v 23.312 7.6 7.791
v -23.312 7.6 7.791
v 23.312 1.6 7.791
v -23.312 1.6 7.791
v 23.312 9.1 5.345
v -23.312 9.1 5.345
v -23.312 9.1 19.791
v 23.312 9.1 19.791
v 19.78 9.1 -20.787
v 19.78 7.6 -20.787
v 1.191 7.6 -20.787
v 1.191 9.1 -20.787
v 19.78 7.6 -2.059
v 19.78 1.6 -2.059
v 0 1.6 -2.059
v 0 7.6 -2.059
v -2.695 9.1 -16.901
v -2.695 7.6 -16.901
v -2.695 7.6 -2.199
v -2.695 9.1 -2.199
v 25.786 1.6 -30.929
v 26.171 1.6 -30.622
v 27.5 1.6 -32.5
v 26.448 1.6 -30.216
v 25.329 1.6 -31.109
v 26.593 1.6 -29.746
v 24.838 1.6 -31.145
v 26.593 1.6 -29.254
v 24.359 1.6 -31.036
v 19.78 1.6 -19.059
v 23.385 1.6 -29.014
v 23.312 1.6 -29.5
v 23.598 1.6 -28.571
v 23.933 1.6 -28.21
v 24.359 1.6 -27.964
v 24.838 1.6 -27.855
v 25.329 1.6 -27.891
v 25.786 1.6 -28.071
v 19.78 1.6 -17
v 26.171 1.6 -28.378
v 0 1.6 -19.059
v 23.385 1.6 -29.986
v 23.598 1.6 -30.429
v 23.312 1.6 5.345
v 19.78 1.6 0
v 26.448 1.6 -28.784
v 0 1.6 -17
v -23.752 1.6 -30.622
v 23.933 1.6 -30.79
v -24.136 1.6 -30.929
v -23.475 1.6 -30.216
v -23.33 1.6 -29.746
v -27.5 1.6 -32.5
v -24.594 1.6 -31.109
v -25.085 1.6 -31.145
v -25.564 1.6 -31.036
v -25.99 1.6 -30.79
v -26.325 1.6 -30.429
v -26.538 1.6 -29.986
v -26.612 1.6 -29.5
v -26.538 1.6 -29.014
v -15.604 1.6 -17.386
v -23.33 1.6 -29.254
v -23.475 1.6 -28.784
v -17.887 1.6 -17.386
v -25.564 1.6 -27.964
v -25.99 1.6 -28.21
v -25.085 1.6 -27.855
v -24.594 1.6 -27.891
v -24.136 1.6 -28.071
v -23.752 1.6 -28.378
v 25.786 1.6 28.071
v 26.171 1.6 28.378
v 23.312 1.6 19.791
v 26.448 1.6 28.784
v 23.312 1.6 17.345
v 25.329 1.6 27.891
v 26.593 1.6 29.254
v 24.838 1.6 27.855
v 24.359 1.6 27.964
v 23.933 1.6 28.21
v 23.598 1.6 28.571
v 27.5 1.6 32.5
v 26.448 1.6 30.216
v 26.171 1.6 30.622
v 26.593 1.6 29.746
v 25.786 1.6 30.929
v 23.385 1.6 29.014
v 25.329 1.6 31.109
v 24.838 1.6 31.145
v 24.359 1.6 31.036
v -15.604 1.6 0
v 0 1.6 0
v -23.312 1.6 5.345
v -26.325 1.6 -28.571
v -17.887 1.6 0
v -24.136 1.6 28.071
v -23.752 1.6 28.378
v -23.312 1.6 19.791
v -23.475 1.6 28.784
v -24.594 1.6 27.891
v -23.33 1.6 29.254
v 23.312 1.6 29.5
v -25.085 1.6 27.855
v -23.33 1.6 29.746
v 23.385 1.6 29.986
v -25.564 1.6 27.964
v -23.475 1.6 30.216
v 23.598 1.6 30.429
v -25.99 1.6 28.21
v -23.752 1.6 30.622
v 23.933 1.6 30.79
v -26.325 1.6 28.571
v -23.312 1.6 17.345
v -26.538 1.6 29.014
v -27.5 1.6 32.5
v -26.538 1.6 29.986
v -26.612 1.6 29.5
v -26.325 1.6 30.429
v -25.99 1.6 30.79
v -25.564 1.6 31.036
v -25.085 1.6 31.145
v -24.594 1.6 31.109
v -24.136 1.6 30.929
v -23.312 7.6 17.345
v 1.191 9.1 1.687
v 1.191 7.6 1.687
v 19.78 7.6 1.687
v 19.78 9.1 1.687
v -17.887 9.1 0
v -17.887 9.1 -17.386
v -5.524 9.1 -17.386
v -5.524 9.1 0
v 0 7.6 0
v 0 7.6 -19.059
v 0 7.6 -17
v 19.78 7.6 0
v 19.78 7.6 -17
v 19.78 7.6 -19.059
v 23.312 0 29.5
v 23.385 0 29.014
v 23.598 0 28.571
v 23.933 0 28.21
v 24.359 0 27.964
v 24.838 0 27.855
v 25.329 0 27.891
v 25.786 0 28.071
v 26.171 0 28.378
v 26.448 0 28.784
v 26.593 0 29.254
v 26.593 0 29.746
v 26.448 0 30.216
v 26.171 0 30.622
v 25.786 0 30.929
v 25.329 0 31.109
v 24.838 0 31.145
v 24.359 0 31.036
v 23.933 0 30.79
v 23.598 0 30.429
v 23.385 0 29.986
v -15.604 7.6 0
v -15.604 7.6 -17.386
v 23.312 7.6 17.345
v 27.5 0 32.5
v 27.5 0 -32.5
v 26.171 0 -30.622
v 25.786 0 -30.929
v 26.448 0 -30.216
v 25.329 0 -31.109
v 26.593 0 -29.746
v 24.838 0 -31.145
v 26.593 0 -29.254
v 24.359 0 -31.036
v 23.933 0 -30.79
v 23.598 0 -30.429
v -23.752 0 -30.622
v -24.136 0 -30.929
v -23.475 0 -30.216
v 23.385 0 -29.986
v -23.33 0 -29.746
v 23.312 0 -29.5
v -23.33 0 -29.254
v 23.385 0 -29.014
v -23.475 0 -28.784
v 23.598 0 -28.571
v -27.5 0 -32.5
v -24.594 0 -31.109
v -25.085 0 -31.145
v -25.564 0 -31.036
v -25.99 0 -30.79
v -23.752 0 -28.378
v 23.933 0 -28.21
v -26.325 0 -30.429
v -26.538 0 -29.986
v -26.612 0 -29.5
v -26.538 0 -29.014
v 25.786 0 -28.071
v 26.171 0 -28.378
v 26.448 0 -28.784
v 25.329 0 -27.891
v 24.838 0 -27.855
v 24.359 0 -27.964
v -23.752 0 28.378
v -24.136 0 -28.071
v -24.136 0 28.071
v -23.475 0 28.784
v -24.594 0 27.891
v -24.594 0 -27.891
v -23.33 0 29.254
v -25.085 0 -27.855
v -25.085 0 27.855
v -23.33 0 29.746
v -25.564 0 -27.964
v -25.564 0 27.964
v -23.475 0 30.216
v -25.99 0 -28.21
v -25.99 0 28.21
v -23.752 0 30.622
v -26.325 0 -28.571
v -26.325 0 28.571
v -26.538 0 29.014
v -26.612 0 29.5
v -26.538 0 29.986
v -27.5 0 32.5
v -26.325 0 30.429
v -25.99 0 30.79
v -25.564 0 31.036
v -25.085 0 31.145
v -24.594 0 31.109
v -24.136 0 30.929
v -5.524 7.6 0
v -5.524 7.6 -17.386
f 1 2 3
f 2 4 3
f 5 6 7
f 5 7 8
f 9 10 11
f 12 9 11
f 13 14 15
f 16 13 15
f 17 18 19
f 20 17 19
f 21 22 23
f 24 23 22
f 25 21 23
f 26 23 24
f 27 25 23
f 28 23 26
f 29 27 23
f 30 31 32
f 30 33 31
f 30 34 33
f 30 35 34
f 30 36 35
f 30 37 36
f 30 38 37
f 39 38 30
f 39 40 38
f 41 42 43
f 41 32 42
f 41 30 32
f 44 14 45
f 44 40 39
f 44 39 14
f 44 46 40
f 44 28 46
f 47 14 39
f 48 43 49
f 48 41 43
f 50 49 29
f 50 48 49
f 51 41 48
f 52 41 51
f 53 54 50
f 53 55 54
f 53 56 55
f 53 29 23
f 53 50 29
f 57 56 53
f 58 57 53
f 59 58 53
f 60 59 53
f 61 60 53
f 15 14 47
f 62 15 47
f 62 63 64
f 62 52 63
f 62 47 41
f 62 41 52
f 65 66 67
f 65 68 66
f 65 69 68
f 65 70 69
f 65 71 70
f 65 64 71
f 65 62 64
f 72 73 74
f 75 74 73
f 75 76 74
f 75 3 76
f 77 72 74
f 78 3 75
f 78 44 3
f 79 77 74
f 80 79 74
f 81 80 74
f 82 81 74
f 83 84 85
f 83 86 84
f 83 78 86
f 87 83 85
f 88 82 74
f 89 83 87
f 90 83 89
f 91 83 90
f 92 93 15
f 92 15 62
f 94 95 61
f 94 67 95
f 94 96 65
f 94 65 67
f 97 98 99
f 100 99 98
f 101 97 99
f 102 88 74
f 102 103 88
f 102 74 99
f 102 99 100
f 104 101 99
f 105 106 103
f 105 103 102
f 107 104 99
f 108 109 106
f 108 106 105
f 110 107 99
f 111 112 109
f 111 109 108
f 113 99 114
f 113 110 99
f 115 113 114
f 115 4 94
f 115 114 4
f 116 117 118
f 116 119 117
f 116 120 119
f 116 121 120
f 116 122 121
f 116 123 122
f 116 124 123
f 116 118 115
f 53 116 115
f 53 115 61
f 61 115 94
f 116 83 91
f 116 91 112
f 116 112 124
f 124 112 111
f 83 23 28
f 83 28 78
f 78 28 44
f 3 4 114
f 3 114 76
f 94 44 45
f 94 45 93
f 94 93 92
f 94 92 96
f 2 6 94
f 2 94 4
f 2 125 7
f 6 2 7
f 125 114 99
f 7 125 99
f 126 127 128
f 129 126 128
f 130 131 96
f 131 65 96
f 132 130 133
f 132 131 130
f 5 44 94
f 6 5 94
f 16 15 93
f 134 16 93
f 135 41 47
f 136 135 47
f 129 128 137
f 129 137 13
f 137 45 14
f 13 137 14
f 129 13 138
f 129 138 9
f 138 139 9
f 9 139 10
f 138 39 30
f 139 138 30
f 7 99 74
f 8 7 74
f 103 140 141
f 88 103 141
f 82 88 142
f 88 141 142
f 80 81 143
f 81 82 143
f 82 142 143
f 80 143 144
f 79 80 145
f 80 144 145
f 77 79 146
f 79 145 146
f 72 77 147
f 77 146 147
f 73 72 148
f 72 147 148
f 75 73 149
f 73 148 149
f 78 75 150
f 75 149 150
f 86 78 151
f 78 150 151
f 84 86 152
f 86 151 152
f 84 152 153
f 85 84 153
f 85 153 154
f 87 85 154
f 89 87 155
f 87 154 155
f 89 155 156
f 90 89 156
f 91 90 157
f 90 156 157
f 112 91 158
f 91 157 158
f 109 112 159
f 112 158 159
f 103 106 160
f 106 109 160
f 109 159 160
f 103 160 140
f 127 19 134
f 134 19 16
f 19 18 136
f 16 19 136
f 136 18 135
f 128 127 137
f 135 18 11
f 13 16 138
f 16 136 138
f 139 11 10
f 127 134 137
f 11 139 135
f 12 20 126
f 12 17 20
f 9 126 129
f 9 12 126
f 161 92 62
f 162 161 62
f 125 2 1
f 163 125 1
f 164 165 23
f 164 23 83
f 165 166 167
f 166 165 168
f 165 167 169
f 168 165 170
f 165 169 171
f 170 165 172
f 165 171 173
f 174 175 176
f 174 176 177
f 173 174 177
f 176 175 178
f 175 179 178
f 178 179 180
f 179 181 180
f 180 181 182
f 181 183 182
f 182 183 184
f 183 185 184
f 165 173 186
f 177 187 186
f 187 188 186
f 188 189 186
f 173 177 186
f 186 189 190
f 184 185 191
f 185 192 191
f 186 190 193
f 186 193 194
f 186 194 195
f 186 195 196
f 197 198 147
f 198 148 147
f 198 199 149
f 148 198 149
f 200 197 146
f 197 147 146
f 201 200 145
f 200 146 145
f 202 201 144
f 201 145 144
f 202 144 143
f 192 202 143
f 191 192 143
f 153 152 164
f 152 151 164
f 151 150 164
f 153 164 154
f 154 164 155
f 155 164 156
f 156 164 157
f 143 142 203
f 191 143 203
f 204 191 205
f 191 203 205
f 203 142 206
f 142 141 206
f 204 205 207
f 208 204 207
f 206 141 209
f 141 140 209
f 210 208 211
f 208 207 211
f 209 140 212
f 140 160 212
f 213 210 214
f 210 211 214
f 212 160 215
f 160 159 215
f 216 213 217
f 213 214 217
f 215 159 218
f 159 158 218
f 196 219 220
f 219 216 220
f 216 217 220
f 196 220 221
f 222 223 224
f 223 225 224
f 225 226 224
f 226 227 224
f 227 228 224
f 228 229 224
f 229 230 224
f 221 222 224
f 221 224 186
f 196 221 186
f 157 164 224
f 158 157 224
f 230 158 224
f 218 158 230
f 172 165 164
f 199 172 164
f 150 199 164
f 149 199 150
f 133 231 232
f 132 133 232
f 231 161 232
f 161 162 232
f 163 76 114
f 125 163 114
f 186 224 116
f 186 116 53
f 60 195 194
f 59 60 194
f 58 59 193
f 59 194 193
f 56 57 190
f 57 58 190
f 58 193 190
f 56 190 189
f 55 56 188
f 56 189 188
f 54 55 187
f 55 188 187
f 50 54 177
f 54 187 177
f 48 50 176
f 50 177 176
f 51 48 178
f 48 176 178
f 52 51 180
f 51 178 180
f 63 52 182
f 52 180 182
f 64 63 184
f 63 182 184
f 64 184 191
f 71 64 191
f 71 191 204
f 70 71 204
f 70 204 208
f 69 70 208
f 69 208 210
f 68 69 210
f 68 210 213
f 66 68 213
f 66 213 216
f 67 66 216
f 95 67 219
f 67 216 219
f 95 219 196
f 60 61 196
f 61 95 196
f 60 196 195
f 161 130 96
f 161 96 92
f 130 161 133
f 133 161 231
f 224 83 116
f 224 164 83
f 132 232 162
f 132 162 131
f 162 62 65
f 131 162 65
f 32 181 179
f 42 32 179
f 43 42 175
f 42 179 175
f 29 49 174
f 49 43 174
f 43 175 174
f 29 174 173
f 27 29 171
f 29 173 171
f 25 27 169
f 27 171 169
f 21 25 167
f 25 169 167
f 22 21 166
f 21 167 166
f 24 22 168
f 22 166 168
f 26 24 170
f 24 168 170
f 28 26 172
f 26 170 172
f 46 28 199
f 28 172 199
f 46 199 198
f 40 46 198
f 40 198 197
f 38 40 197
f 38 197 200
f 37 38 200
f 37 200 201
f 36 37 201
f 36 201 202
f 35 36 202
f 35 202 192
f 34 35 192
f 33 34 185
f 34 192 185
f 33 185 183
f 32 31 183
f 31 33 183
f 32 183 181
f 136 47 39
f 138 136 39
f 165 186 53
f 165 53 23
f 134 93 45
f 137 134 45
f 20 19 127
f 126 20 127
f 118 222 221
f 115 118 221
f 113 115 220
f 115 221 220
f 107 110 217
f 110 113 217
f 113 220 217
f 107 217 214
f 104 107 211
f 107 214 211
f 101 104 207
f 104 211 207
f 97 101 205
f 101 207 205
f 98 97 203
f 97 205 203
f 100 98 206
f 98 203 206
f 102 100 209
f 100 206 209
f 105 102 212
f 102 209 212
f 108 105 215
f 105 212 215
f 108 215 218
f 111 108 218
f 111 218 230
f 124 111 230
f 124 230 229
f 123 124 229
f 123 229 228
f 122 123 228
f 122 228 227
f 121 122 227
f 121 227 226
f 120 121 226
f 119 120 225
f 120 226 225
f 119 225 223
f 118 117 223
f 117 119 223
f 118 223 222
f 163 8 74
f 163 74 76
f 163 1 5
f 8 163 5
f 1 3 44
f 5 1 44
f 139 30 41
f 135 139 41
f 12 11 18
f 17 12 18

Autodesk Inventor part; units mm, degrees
ref_plane "YZ Plane" through (0, 0, 0) normal (1, 0, 0) x (0, 1, 0)
ref_plane "XZ Plane" through (0, 0, 0) normal (0, 1, 0) x (-1, 0, 0)
ref_plane "XY Plane" through (0, 0, 0) normal (0, 0, 1) x (1, 0, 0)
sketch "Esquisse1" plane through (0, 0, 0) normal (0, 1, 0) x (-1, 0, 0)
  line L0 (-27.5, 32.5) -> (27.5, 32.5)
  line L1 (27.5, 32.5) -> (27.5, -32.5)
  line L2 (27.5, -32.5) -> (-27.5, -32.5)
  line L3 (-27.5, -32.5) -> (-27.5, 32.5)
  line L4 (-27.5, 32.5) -> (27.5, -32.5) construction
  line L5 (27.5, 32.5) -> (-27.5, -32.5) construction
  line L6 (-24.9615, 29.5) -> (24.9615, 29.5) construction
  line L7 (24.9615, 29.5) -> (24.9615, -29.5) construction
  line L8 (24.9615, -29.5) -> (-24.9615, -29.5) construction
  line L9 (-24.9615, -29.5) -> (-24.9615, 29.5) construction
  line L10 (-24.9615, 29.5) -> (24.9615, -29.5) construction
  line L11 (24.9615, 29.5) -> (-24.9615, -29.5) construction
  circle A0 centre (24.9615, 29.5) radius 1.65
  circle A1 centre (-24.9615, 29.5) radius 1.65
  circle A2 centre (-24.9615, -29.5) radius 1.65
  circle A3 centre (24.9615, -29.5) radius 1.65
  point P0 (0, 0)
  dimension "d0" = 65
  dimension "d1" = 55
  dimension "d3" = 3.3
  dimension "d6" = 3
extrude "Extrusion1" add sketch "Esquisse1" along normal blind 1.6
sketch "Esquisse2" plane through (0, 1.6, 0) normal (0, 1, 0) x (1, 0, 0)
  circle A0 centre (-24.9615, 29.5) radius 1.65 construction
  circle A1 centre (24.9615, 29.5) radius 1.65 construction
  circle A2 centre (24.9615, -29.5) radius 1.65 construction
  circle A3 centre (-24.9615, -29.5) radius 1.65 construction
  line L0 (-27.5, -32.5) -> (27.5, -32.5) construction
  line L1 (27.5, -32.5) -> (27.5, 32.5) construction
  line L2 (27.5, 32.5) -> (-27.5, 32.5) construction
  line L3 (-27.5, 32.5) -> (-27.5, -32.5) construction
  line L4 (-23.3115, -19.7912) -> (23.3115, -19.7912)
  line L5 (23.3115, -19.7912) -> (23.3115, -17.3453)
  line L6 (23.3115, -17.3453) -> (-23.3115, -17.3453)
  line L7 (-23.3115, -17.3453) -> (-23.3115, -19.7912)
  line L8 (-23.3115, -7.7912) -> (23.3115, -7.7912)
  line L9 (23.3115, -7.7912) -> (23.3115, -5.3453)
  line L10 (23.3115, -5.3453) -> (-23.3115, -5.3453)
  line L11 (-23.3115, -5.3453) -> (-23.3115, -7.7912)
  line L12 (-17.887, 0) -> (-15.6042, 0)
  line L13 (-15.6042, 0) -> (-15.6042, 17.3864)
  line L14 (-15.6042, 17.3864) -> (-17.887, 17.3864)
  line L15 (-17.887, 17.3864) -> (-17.887, 0)
  line L16 (0, 0) -> (19.7798, 0)
  line L17 (19.7798, 0) -> (19.7798, 2.0588)
  line L18 (19.7798, 2.0588) -> (0, 2.0588)
  line L19 (0, 2.0588) -> (0, 0)
  line L20 (0, 17) -> (19.7798, 17)
  line L21 (19.7798, 17) -> (19.7798, 19.0588)
  line L22 (19.7798, 19.0588) -> (0, 19.0588)
  line L23 (0, 19.0588) -> (0, 17)
  dimension "d9" = 12
  dimension "d16" = 17
extrude "Extrusion2" add sketch "Esquisse2" along normal blind 6
sketch "Esquisse3" plane through (0, 7.6, 0) normal (0, 1, 0) x (1, 0, 0)
  line L0 (-23.3115, -7.7912) -> (23.3115, -7.7912) construction
  line L1 (23.3115, -7.7912) -> (23.3115, -5.3453) construction
  line L2 (23.3115, -5.3453) -> (-23.3115, -5.3453) construction
  line L3 (-23.3115, -5.3453) -> (-23.3115, -7.7912) construction
  line L4 (-23.3115, -19.7912) -> (23.3115, -19.7912) construction
  line L5 (23.3115, -19.7912) -> (23.3115, -17.3453) construction
  line L6 (23.3115, -17.3453) -> (-23.3115, -17.3453) construction
  line L7 (-23.3115, -17.3453) -> (-23.3115, -19.7912) construction
  line L8 (0, 0) -> (19.7798, 0) construction
  line L9 (19.7798, 0) -> (19.7798, 2.0588) construction
  line L10 (19.7798, 2.0588) -> (0, 2.0588) construction
  line L11 (0, 2.0588) -> (0, 0) construction
  line L12 (0, 17) -> (19.7798, 17) construction
  line L13 (19.7798, 17) -> (19.7798, 19.0588) construction
  line L14 (19.7798, 19.0588) -> (0, 19.0588) construction
  line L15 (0, 19.0588) -> (0, 17) construction
  line L16 (-17.887, 0) -> (-15.6042, 0) projected
  line L17 (-15.6042, 0) -> (-15.6042, 17.3864) projected
  line L18 (-15.6042, 17.3864) -> (-17.887, 17.3864) projected
  line L19 (-17.887, 17.3864) -> (-17.887, 0) projected
  line L20 (-23.3115, -19.7912) -> (23.3115, -19.7912)
  line L21 (23.3115, -19.7912) -> (23.3115, -5.3453)
  line L22 (23.3115, -5.3453) -> (-23.3115, -5.3453)
  line L23 (-23.3115, -5.3453) -> (-23.3115, -19.7912)
  line L24 (19.7798, -1.6873) -> (19.7798, 20.7873)
  line L25 (19.7798, 20.7873) -> (1.1914, 20.7873)
  line L26 (1.1914, 20.7873) -> (-2.6949, 16.9011)
  line L27 (-2.6949, 16.9011) -> (-2.6949, 2.1989)
  line L28 (-2.6949, 2.1989) -> (1.1914, -1.6873)
  line L29 (1.1914, -1.6873) -> (19.7798, -1.6873)
  line L30 (1.1914, 20.7873) -> (1.1914, -1.6873) construction
  line L31 (-17.887, 0) -> (-5.5241, 0)
  line L32 (-5.5241, 0) -> (-5.5241, 17.3864)
  line L33 (-5.5241, 17.3864) -> (-17.887, 17.3864)
  line L34 (-17.887, 17.3864) -> (-17.887, 0)
extrude "Extrusion3" add sketch "Esquisse3" along normal blind 1.5
properties part number "board"
